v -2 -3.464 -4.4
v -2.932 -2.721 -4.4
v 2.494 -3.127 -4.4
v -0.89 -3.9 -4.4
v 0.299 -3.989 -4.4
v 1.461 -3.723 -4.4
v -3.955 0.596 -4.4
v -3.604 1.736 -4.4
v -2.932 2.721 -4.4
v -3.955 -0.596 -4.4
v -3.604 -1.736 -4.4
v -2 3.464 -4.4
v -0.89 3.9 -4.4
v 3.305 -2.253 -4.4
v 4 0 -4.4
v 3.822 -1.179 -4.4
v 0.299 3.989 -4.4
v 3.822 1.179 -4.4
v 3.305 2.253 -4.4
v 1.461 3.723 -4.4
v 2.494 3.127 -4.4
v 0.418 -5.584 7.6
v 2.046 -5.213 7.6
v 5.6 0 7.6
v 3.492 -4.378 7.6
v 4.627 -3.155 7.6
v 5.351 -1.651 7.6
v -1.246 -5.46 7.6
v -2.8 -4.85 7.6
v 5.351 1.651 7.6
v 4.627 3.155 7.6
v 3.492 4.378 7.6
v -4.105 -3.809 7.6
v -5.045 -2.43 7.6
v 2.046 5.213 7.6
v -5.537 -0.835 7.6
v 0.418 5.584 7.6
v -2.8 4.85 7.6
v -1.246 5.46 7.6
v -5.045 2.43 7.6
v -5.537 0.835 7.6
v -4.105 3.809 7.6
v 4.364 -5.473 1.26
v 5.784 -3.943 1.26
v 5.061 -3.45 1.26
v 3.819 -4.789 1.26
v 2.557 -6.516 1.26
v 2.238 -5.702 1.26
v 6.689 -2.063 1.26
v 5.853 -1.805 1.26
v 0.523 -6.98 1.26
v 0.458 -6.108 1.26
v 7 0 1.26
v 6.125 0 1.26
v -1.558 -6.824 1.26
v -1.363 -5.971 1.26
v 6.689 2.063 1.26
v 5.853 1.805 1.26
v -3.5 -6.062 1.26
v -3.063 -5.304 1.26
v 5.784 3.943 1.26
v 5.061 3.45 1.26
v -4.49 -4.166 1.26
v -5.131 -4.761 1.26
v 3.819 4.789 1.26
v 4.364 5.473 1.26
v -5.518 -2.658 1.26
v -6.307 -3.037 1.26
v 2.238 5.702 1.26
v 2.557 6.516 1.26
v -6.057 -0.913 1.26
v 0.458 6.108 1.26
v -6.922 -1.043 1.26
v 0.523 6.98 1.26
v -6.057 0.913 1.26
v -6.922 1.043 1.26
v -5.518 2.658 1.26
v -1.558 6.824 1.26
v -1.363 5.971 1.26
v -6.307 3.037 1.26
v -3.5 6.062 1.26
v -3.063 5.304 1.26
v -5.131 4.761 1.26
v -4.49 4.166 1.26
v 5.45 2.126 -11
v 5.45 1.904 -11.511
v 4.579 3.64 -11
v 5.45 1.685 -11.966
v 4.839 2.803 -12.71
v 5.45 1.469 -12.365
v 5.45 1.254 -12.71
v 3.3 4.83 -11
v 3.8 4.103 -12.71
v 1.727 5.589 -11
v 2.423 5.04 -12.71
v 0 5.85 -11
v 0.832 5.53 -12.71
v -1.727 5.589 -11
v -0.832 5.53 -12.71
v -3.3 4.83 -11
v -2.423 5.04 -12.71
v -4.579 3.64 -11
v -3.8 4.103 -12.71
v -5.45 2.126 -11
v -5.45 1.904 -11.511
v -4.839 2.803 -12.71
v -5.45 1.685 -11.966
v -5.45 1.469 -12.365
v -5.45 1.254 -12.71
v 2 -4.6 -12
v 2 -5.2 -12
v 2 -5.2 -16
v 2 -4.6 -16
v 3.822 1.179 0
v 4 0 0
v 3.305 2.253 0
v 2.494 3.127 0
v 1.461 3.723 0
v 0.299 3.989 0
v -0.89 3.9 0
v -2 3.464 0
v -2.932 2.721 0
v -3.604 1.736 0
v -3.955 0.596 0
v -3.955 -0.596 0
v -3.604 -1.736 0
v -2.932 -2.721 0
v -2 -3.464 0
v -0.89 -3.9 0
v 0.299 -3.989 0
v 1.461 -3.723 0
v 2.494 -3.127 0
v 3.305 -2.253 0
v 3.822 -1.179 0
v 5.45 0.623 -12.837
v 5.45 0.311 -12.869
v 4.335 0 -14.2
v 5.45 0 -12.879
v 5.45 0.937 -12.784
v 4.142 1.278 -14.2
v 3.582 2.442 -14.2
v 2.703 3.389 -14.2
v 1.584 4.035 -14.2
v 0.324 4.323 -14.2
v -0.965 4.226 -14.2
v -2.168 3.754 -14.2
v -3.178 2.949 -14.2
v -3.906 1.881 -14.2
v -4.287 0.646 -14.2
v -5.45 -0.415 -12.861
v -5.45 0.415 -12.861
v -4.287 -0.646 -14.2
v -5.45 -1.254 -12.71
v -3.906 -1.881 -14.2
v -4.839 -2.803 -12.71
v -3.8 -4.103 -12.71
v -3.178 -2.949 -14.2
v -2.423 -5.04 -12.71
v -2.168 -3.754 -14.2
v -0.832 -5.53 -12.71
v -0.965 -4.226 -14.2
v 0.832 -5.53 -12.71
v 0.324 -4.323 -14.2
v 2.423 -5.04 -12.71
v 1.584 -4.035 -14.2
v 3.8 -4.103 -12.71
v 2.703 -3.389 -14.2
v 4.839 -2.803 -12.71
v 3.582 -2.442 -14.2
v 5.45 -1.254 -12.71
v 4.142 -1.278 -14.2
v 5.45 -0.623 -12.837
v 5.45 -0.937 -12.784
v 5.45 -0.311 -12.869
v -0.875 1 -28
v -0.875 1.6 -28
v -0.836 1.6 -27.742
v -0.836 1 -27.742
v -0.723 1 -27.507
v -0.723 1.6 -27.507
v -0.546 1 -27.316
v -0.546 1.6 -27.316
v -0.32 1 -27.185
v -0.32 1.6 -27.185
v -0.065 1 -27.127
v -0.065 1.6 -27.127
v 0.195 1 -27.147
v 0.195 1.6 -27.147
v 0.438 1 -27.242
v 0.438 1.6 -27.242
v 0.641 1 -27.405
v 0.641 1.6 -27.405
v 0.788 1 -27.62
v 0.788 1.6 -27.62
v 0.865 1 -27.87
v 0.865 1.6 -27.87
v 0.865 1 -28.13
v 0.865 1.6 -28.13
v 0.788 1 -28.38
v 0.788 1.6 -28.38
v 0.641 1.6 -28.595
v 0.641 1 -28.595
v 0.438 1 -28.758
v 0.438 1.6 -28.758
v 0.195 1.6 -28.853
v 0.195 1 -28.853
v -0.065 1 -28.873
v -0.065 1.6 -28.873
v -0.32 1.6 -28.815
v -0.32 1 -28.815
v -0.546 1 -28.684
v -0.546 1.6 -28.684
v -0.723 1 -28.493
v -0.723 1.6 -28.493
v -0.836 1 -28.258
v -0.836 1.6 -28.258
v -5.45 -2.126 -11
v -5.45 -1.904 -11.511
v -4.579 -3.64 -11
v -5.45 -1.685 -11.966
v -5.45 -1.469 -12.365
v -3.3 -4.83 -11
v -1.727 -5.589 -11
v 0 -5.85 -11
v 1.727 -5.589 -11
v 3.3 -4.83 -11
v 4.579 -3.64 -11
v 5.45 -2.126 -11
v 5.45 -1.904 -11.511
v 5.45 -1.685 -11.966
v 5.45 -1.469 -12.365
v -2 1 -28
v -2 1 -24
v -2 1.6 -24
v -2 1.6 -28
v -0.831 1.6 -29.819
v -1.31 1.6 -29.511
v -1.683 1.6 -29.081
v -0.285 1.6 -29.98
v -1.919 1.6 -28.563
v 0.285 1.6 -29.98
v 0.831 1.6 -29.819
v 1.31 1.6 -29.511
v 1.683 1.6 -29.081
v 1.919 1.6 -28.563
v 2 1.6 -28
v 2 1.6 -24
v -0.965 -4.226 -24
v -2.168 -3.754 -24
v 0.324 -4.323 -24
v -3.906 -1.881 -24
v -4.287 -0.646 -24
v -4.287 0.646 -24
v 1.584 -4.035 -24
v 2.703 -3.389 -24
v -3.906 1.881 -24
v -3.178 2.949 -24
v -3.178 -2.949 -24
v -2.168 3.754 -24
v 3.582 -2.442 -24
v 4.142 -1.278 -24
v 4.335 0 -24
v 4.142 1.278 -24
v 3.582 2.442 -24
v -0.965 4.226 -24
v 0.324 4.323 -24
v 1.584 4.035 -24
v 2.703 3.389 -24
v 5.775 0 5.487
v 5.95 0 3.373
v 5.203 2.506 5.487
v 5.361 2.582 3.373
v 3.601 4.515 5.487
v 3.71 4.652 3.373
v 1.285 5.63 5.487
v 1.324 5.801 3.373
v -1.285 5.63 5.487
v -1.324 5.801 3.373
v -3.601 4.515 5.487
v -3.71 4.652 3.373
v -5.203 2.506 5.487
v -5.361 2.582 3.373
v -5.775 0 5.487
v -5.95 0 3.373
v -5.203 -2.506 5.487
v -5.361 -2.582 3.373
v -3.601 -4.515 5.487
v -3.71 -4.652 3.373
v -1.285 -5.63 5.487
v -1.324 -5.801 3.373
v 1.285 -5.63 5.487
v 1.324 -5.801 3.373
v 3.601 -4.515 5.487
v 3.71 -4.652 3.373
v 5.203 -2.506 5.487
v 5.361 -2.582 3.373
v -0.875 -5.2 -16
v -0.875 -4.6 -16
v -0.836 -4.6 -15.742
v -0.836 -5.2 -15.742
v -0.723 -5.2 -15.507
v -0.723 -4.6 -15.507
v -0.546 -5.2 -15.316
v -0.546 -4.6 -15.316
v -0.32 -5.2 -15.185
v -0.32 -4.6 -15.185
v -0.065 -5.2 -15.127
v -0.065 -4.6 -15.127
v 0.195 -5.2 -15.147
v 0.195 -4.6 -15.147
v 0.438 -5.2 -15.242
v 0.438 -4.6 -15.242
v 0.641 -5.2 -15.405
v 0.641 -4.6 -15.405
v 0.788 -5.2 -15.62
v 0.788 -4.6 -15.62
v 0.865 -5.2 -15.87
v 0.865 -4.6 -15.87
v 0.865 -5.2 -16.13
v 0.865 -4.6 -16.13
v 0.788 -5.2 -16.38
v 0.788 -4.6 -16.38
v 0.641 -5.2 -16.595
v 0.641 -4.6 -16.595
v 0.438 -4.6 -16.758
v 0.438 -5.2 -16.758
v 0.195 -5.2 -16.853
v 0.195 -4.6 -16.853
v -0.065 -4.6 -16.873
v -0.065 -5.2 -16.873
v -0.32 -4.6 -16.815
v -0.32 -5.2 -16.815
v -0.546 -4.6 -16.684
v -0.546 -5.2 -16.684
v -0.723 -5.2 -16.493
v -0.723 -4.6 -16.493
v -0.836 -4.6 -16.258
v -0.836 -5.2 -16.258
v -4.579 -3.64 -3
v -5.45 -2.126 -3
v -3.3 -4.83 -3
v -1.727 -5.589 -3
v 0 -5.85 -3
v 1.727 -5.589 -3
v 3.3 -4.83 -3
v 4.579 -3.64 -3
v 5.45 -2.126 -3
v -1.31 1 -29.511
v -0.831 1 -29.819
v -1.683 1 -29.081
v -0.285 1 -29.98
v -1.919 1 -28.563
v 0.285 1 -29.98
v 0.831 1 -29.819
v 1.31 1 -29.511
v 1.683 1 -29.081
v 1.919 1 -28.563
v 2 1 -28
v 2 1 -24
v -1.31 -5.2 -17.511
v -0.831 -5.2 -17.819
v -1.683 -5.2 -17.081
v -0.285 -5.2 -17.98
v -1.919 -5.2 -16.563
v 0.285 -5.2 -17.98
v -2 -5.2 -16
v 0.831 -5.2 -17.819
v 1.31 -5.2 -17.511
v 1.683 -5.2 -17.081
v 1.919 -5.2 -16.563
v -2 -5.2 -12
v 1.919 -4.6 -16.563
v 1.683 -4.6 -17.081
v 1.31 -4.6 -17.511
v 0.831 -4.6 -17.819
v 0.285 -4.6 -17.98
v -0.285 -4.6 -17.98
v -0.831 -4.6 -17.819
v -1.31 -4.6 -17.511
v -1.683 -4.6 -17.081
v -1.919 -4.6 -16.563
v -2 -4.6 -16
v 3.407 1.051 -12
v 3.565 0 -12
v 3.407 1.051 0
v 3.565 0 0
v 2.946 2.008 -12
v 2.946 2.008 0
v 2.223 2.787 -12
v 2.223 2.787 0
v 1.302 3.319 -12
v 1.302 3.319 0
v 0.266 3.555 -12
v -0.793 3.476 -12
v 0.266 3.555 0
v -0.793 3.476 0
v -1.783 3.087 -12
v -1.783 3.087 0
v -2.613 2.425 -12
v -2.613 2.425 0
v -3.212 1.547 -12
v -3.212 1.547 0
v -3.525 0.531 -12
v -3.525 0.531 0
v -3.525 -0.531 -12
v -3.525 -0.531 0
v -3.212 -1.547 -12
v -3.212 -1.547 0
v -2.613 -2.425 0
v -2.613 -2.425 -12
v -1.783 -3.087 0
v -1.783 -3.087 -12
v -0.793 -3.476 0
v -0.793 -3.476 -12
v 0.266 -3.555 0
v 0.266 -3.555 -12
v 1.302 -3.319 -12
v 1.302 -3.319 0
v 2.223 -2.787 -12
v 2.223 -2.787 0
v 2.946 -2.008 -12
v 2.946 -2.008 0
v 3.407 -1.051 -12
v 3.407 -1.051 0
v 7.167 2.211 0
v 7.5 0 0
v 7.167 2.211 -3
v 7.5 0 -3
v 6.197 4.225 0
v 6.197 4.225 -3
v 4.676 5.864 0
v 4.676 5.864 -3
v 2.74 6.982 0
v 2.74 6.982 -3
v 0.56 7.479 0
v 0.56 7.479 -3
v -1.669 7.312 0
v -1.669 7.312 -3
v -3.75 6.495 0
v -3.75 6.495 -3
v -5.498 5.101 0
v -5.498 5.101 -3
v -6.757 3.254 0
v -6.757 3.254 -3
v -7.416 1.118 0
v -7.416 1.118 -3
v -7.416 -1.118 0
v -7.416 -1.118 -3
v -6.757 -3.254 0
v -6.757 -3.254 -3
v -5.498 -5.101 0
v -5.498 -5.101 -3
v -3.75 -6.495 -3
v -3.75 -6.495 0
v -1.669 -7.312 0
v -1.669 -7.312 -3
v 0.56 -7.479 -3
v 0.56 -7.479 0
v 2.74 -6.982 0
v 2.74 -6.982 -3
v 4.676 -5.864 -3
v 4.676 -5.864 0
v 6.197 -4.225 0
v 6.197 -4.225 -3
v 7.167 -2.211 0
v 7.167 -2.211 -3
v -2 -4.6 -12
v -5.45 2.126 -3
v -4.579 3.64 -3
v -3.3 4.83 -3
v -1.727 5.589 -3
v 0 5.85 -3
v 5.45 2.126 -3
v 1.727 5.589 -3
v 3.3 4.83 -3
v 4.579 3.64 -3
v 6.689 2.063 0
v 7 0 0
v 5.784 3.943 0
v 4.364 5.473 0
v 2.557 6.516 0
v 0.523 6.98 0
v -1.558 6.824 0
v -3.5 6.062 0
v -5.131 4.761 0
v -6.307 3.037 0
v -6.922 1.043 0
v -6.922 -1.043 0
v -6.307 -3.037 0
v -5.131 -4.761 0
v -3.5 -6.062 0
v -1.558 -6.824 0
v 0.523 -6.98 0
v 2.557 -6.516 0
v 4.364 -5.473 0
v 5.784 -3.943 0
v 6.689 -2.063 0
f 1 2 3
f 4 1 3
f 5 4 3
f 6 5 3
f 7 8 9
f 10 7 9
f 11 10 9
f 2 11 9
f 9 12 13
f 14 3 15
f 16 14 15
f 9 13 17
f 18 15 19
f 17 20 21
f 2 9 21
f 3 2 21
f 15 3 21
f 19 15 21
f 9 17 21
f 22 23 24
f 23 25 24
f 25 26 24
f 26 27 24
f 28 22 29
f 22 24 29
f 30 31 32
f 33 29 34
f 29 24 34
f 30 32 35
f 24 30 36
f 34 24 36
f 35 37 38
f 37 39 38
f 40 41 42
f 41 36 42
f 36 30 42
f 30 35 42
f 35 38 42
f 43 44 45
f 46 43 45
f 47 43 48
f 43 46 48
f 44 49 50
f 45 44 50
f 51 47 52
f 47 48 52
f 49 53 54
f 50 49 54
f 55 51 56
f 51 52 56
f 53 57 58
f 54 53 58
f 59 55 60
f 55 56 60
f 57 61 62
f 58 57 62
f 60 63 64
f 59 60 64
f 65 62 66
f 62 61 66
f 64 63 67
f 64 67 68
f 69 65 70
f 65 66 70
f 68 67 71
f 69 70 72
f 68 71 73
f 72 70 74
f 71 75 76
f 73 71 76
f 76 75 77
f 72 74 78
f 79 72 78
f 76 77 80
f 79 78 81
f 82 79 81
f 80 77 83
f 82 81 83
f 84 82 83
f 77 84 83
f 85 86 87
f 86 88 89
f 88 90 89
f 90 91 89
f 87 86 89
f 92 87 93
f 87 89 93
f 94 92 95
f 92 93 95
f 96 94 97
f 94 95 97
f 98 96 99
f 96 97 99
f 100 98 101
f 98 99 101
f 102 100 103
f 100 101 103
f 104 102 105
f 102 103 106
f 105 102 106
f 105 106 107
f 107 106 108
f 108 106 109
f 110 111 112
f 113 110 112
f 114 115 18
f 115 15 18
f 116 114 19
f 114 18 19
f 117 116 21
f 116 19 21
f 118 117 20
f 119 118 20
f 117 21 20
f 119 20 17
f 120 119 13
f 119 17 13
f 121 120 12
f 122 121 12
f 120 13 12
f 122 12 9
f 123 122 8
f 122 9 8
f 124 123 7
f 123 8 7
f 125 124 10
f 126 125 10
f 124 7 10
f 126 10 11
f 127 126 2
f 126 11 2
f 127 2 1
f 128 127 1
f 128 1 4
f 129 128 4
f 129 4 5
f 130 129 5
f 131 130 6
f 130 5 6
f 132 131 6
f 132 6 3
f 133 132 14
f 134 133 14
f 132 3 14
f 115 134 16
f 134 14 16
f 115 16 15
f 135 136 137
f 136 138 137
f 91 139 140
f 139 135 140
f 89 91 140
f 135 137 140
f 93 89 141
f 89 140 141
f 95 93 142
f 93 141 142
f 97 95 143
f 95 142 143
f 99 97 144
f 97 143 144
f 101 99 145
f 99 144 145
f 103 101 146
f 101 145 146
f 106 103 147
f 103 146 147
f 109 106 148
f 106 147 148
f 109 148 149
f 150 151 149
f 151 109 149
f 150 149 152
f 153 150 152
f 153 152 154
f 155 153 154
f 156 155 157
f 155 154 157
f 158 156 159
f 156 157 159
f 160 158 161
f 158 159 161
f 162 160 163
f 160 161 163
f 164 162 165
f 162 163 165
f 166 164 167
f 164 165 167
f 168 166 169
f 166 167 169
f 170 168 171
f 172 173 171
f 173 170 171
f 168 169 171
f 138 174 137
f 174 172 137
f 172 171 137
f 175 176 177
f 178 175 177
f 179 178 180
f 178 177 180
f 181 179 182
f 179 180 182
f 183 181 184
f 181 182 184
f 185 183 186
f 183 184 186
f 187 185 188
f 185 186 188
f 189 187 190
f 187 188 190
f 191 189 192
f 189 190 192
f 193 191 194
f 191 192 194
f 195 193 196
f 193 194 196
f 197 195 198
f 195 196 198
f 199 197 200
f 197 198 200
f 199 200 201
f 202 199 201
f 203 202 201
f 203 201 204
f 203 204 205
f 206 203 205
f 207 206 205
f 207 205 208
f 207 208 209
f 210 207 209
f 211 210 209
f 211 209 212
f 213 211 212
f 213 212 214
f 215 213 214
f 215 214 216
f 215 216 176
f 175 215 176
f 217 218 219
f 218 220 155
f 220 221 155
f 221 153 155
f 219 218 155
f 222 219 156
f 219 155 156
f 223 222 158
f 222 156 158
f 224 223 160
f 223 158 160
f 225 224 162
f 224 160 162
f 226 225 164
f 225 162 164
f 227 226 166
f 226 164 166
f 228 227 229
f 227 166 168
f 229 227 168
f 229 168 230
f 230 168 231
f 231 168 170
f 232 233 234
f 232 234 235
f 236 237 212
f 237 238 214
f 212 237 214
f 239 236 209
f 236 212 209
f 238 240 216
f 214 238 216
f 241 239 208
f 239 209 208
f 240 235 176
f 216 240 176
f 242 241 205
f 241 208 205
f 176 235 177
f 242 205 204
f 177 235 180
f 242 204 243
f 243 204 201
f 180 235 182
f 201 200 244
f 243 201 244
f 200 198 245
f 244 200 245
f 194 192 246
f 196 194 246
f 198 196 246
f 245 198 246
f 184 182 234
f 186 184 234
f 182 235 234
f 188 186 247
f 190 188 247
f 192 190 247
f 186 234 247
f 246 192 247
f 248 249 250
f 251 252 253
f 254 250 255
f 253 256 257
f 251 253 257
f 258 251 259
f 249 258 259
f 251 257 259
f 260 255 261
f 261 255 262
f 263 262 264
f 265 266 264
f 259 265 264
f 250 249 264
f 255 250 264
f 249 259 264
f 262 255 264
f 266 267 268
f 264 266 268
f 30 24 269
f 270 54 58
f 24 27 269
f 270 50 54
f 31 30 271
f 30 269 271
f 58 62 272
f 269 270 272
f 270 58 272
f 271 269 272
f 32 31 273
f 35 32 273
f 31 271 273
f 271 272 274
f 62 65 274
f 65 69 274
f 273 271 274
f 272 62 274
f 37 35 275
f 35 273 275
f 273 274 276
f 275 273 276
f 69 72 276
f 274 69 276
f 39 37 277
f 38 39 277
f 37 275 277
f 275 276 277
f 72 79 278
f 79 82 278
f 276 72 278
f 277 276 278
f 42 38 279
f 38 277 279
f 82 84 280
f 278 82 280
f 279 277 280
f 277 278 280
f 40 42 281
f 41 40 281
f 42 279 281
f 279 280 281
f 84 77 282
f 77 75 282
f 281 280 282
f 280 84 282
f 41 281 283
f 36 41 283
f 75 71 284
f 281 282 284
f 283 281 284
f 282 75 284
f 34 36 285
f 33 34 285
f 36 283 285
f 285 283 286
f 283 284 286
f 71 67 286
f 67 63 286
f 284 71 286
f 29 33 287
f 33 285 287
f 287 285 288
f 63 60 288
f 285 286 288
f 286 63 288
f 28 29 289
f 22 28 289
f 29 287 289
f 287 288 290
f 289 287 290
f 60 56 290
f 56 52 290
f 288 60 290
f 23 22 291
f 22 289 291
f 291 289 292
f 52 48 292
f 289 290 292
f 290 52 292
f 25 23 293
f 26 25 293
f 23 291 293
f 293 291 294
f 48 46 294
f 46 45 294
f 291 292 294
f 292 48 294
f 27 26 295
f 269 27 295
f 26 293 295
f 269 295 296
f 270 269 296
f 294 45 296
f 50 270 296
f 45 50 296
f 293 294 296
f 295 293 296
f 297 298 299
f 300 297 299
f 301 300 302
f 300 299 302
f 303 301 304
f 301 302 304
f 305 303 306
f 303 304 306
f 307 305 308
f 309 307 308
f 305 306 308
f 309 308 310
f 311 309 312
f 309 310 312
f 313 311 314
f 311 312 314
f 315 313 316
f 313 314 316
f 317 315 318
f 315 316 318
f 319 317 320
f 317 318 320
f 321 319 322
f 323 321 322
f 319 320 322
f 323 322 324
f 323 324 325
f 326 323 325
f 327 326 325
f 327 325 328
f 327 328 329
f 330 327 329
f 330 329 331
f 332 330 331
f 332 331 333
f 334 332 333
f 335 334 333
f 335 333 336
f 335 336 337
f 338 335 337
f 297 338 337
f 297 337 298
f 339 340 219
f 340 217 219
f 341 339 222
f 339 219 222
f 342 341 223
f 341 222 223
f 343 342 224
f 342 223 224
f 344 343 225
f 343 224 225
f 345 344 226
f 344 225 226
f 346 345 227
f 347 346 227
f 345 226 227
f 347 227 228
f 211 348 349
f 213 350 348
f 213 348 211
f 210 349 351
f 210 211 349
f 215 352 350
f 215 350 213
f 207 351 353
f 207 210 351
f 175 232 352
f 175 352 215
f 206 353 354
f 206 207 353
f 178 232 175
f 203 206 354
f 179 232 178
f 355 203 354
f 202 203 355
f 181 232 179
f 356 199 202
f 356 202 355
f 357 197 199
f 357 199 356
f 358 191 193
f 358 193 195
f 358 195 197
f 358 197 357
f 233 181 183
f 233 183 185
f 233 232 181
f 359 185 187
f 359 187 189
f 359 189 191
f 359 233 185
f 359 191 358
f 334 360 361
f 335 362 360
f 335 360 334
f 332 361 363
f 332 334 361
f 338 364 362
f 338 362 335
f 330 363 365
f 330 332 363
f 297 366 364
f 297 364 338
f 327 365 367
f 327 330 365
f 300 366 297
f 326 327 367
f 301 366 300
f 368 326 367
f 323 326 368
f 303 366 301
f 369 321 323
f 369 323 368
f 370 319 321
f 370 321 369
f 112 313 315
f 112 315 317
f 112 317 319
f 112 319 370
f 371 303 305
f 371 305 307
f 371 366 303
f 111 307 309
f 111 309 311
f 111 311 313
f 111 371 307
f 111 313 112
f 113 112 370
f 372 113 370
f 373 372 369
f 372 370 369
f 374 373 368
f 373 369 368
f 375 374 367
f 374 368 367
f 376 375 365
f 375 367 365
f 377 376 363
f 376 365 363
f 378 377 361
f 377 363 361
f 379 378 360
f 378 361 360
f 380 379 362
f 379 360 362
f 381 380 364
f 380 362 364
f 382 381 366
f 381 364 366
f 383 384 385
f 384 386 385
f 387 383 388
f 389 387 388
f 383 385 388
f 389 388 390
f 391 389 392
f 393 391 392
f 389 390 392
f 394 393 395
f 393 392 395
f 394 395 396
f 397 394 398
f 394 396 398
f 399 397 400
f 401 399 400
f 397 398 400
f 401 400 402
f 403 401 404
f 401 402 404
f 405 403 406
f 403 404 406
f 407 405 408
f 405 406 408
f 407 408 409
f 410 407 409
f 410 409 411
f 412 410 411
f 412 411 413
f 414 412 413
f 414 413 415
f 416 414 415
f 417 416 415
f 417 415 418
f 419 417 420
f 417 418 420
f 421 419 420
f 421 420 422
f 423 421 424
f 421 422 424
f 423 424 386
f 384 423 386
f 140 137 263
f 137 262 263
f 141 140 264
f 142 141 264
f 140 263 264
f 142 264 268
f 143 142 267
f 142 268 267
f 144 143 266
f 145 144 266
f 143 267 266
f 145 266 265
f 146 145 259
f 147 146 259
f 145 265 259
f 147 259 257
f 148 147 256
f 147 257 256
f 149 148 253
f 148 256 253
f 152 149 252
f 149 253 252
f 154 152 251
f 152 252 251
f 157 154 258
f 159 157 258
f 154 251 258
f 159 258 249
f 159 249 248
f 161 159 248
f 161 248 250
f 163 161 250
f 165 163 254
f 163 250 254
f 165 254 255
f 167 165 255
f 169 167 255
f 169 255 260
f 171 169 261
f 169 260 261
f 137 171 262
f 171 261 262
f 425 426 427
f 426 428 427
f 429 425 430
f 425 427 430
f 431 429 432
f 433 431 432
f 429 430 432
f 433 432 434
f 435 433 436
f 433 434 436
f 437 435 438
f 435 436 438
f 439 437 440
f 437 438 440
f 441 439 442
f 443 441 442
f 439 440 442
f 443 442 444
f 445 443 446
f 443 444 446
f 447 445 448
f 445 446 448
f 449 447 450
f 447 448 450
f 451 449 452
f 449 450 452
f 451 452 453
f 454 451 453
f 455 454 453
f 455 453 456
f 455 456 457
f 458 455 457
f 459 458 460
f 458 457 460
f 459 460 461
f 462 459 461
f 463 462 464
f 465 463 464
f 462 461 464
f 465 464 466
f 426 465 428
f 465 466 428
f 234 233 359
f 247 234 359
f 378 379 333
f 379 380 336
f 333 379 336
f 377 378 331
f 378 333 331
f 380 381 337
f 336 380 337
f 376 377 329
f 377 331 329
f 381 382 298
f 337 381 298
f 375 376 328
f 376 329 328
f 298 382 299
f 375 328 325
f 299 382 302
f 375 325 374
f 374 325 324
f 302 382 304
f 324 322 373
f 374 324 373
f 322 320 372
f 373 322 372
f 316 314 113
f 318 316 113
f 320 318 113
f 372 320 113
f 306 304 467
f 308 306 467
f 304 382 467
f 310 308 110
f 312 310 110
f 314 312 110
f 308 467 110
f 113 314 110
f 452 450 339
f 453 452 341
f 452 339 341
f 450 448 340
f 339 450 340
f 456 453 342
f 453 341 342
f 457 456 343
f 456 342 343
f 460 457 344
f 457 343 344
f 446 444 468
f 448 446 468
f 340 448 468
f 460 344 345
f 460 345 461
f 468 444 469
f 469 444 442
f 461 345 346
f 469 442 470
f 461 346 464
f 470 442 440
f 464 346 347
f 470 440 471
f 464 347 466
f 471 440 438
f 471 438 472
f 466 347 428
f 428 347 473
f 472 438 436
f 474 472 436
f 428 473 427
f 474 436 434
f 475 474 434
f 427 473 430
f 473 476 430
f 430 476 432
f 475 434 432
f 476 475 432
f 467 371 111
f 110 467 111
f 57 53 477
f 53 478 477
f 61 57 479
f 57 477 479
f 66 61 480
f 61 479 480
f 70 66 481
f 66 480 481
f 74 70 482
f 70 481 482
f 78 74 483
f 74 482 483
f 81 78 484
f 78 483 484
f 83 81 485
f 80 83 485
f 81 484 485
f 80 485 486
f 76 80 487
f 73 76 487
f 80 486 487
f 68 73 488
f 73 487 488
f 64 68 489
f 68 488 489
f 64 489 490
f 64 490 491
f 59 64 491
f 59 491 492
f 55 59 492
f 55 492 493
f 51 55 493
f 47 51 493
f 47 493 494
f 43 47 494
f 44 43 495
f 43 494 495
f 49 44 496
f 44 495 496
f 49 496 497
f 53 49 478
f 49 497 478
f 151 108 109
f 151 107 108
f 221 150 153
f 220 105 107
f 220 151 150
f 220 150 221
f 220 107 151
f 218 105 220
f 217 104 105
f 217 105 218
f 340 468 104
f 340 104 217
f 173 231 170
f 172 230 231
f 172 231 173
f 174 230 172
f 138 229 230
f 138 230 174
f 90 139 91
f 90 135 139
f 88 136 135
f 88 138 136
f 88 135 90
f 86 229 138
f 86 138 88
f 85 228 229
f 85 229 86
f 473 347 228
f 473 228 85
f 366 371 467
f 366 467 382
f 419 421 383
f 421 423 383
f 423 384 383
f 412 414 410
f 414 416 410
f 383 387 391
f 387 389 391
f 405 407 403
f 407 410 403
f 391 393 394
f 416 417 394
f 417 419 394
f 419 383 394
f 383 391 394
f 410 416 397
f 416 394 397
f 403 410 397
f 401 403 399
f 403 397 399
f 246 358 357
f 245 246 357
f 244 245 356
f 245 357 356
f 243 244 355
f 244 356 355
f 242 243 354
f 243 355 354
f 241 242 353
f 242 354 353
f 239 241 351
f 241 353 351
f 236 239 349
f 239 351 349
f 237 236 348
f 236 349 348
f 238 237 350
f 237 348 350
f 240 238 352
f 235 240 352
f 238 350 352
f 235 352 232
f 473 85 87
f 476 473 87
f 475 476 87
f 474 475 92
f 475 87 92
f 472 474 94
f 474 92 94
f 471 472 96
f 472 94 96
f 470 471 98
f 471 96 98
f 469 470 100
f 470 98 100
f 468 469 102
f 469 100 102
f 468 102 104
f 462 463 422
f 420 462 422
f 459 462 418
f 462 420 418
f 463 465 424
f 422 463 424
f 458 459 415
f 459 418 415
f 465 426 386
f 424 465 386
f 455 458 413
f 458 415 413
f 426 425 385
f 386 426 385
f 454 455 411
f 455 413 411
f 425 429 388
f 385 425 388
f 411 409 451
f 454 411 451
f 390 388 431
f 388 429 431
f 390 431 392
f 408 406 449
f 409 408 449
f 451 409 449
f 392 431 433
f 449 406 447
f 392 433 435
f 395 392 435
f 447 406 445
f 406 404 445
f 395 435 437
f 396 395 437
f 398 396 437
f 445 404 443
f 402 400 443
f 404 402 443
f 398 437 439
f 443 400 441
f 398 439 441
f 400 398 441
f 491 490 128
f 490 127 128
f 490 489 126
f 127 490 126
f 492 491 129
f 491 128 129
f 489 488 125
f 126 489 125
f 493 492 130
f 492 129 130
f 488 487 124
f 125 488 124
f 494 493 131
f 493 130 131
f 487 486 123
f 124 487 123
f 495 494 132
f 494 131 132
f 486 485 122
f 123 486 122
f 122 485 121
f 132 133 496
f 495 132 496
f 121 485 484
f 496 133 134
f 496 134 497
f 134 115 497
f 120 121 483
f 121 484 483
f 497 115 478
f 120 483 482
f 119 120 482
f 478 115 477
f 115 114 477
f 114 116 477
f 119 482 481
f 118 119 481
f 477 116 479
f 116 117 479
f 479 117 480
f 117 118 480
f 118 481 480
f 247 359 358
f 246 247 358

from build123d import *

# Parameters (mm, degrees)
SKETCH042_R             = 10.5
POCKET019_DEPTH         = 13
PAD021_DEPTH            = 0.6
SKETCH045_R             = 0.875
POCKET020_DEPTH         = 0.601
BODY012_PLACEMENT_ANGLE = 90
PAD022_DEPTH            = 0.6
SKETCH047_R             = 0.875
POCKET021_DEPTH         = 0.601
BODY013_PLACEMENT_ANGLE = 90


with BuildPart() as corps002:
    # Sketch041 → Revolution (revolve)
    with BuildSketch(Plane.XZ):
        Polygon((3.565, -12), (3.565, 0), (7.5, 0), (7.5, -3), (5.85, -3), (5.85, -11), (5.5925, -12.710466), (4.335, -14.2), (4.335, -24), (0, -24), (0, -12), align=None)
    revolve(axis=Axis((0, 0, 0), (0, 0, 1)))

    # Sketch042 (on DatumPlane) → Pocket019 (cut)
    with BuildSketch(Plane.XY.offset(-3)):
        Circle(SKETCH042_R)
        with BuildLine():
            ThreePointArc((-5.45, -2.126029), (0, -5.85), (5.45, -2.126029))
            Line((5.45, -2.126029), (5.45, 2.126029))
            ThreePointArc((5.45, 2.126029), (0, 5.85), (-5.45, 2.126029))
            Line((-5.45, 2.126029), (-5.45, -2.126029))
        make_face(mode=Mode.SUBTRACT)
    extrude(amount=-POCKET019_DEPTH, mode=Mode.SUBTRACT)


with BuildPart() as bouchon:
    # Sketch043 → Revolution001 (revolve)
    with BuildSketch(Plane.XZ):
        Polygon((0, 7.6), (5.6, 7.6), (6.125, 1.26), (7, 1.26), (7, 0), (4, 0), (4, -4.4), (0, -4.4), align=None)
    revolve(axis=Axis((0, 0, 0), (0, 0, 1)))


with BuildPart() as cosse1:
    # Sketch044 (on DatumPlane) → Pad021 (new body)
    with BuildSketch(Plane.YZ.offset(1)):
        with BuildLine():
            Line((0, -24), (2, -24))
            Line((2, -24), (2, -28))
            ThreePointArc((-2, -28), (0, -30), (2, -28))
            Line((-2, -24), (-2, -28))
            Line((0, -24), (-2, -24))
        make_face()
    extrude(amount=PAD021_DEPTH)

    # Sketch045 (on Face7 of Pad021) → Pocket020 (cut, through all)
    with BuildSketch(Plane.YZ.offset(1.6)):
        with Locations((0, -28)):
            Circle(SKETCH045_R)
    extrude(amount=-POCKET020_DEPTH, mode=Mode.SUBTRACT)


with BuildPart() as cosse1_1:
    # Body012 placement: moved
    add(cosse1.part.rotate(Axis((0, 0, 0), (0, 0, 1)), BODY012_PLACEMENT_ANGLE))


with BuildPart() as cosse002:
    # Sketch046 (on DatumPlane) → Pad022 (new body)
    with BuildSketch(Plane.YZ.offset(1)):
        with BuildLine():
            Line((0, -24), (2, -24))
            Line((2, -24), (2, -28))
            ThreePointArc((-2, -28), (0, -30), (2, -28))
            Line((-2, -24), (-2, -28))
            Line((0, -24), (-2, -24))
        make_face()
    extrude(amount=PAD022_DEPTH)

    # Sketch047 (on Face7 of Pad022) → Pocket021 (cut, through all)
    with BuildSketch(Plane.YZ.offset(1.6)):
        with Locations((0, -28)):
            Circle(SKETCH047_R)
    extrude(amount=-POCKET021_DEPTH, mode=Mode.SUBTRACT)


with BuildPart() as cosse002_1:
    # Body013 placement: moved
    add(cosse002.part.moved(Location((0, -6.2, 12))).rotate(Axis((0, -6.2, 12), (0, 0, 1)), BODY013_PLACEMENT_ANGLE))


solid = Compound([corps002.part, bouchon.part, cosse1_1.part, cosse002_1.part])
